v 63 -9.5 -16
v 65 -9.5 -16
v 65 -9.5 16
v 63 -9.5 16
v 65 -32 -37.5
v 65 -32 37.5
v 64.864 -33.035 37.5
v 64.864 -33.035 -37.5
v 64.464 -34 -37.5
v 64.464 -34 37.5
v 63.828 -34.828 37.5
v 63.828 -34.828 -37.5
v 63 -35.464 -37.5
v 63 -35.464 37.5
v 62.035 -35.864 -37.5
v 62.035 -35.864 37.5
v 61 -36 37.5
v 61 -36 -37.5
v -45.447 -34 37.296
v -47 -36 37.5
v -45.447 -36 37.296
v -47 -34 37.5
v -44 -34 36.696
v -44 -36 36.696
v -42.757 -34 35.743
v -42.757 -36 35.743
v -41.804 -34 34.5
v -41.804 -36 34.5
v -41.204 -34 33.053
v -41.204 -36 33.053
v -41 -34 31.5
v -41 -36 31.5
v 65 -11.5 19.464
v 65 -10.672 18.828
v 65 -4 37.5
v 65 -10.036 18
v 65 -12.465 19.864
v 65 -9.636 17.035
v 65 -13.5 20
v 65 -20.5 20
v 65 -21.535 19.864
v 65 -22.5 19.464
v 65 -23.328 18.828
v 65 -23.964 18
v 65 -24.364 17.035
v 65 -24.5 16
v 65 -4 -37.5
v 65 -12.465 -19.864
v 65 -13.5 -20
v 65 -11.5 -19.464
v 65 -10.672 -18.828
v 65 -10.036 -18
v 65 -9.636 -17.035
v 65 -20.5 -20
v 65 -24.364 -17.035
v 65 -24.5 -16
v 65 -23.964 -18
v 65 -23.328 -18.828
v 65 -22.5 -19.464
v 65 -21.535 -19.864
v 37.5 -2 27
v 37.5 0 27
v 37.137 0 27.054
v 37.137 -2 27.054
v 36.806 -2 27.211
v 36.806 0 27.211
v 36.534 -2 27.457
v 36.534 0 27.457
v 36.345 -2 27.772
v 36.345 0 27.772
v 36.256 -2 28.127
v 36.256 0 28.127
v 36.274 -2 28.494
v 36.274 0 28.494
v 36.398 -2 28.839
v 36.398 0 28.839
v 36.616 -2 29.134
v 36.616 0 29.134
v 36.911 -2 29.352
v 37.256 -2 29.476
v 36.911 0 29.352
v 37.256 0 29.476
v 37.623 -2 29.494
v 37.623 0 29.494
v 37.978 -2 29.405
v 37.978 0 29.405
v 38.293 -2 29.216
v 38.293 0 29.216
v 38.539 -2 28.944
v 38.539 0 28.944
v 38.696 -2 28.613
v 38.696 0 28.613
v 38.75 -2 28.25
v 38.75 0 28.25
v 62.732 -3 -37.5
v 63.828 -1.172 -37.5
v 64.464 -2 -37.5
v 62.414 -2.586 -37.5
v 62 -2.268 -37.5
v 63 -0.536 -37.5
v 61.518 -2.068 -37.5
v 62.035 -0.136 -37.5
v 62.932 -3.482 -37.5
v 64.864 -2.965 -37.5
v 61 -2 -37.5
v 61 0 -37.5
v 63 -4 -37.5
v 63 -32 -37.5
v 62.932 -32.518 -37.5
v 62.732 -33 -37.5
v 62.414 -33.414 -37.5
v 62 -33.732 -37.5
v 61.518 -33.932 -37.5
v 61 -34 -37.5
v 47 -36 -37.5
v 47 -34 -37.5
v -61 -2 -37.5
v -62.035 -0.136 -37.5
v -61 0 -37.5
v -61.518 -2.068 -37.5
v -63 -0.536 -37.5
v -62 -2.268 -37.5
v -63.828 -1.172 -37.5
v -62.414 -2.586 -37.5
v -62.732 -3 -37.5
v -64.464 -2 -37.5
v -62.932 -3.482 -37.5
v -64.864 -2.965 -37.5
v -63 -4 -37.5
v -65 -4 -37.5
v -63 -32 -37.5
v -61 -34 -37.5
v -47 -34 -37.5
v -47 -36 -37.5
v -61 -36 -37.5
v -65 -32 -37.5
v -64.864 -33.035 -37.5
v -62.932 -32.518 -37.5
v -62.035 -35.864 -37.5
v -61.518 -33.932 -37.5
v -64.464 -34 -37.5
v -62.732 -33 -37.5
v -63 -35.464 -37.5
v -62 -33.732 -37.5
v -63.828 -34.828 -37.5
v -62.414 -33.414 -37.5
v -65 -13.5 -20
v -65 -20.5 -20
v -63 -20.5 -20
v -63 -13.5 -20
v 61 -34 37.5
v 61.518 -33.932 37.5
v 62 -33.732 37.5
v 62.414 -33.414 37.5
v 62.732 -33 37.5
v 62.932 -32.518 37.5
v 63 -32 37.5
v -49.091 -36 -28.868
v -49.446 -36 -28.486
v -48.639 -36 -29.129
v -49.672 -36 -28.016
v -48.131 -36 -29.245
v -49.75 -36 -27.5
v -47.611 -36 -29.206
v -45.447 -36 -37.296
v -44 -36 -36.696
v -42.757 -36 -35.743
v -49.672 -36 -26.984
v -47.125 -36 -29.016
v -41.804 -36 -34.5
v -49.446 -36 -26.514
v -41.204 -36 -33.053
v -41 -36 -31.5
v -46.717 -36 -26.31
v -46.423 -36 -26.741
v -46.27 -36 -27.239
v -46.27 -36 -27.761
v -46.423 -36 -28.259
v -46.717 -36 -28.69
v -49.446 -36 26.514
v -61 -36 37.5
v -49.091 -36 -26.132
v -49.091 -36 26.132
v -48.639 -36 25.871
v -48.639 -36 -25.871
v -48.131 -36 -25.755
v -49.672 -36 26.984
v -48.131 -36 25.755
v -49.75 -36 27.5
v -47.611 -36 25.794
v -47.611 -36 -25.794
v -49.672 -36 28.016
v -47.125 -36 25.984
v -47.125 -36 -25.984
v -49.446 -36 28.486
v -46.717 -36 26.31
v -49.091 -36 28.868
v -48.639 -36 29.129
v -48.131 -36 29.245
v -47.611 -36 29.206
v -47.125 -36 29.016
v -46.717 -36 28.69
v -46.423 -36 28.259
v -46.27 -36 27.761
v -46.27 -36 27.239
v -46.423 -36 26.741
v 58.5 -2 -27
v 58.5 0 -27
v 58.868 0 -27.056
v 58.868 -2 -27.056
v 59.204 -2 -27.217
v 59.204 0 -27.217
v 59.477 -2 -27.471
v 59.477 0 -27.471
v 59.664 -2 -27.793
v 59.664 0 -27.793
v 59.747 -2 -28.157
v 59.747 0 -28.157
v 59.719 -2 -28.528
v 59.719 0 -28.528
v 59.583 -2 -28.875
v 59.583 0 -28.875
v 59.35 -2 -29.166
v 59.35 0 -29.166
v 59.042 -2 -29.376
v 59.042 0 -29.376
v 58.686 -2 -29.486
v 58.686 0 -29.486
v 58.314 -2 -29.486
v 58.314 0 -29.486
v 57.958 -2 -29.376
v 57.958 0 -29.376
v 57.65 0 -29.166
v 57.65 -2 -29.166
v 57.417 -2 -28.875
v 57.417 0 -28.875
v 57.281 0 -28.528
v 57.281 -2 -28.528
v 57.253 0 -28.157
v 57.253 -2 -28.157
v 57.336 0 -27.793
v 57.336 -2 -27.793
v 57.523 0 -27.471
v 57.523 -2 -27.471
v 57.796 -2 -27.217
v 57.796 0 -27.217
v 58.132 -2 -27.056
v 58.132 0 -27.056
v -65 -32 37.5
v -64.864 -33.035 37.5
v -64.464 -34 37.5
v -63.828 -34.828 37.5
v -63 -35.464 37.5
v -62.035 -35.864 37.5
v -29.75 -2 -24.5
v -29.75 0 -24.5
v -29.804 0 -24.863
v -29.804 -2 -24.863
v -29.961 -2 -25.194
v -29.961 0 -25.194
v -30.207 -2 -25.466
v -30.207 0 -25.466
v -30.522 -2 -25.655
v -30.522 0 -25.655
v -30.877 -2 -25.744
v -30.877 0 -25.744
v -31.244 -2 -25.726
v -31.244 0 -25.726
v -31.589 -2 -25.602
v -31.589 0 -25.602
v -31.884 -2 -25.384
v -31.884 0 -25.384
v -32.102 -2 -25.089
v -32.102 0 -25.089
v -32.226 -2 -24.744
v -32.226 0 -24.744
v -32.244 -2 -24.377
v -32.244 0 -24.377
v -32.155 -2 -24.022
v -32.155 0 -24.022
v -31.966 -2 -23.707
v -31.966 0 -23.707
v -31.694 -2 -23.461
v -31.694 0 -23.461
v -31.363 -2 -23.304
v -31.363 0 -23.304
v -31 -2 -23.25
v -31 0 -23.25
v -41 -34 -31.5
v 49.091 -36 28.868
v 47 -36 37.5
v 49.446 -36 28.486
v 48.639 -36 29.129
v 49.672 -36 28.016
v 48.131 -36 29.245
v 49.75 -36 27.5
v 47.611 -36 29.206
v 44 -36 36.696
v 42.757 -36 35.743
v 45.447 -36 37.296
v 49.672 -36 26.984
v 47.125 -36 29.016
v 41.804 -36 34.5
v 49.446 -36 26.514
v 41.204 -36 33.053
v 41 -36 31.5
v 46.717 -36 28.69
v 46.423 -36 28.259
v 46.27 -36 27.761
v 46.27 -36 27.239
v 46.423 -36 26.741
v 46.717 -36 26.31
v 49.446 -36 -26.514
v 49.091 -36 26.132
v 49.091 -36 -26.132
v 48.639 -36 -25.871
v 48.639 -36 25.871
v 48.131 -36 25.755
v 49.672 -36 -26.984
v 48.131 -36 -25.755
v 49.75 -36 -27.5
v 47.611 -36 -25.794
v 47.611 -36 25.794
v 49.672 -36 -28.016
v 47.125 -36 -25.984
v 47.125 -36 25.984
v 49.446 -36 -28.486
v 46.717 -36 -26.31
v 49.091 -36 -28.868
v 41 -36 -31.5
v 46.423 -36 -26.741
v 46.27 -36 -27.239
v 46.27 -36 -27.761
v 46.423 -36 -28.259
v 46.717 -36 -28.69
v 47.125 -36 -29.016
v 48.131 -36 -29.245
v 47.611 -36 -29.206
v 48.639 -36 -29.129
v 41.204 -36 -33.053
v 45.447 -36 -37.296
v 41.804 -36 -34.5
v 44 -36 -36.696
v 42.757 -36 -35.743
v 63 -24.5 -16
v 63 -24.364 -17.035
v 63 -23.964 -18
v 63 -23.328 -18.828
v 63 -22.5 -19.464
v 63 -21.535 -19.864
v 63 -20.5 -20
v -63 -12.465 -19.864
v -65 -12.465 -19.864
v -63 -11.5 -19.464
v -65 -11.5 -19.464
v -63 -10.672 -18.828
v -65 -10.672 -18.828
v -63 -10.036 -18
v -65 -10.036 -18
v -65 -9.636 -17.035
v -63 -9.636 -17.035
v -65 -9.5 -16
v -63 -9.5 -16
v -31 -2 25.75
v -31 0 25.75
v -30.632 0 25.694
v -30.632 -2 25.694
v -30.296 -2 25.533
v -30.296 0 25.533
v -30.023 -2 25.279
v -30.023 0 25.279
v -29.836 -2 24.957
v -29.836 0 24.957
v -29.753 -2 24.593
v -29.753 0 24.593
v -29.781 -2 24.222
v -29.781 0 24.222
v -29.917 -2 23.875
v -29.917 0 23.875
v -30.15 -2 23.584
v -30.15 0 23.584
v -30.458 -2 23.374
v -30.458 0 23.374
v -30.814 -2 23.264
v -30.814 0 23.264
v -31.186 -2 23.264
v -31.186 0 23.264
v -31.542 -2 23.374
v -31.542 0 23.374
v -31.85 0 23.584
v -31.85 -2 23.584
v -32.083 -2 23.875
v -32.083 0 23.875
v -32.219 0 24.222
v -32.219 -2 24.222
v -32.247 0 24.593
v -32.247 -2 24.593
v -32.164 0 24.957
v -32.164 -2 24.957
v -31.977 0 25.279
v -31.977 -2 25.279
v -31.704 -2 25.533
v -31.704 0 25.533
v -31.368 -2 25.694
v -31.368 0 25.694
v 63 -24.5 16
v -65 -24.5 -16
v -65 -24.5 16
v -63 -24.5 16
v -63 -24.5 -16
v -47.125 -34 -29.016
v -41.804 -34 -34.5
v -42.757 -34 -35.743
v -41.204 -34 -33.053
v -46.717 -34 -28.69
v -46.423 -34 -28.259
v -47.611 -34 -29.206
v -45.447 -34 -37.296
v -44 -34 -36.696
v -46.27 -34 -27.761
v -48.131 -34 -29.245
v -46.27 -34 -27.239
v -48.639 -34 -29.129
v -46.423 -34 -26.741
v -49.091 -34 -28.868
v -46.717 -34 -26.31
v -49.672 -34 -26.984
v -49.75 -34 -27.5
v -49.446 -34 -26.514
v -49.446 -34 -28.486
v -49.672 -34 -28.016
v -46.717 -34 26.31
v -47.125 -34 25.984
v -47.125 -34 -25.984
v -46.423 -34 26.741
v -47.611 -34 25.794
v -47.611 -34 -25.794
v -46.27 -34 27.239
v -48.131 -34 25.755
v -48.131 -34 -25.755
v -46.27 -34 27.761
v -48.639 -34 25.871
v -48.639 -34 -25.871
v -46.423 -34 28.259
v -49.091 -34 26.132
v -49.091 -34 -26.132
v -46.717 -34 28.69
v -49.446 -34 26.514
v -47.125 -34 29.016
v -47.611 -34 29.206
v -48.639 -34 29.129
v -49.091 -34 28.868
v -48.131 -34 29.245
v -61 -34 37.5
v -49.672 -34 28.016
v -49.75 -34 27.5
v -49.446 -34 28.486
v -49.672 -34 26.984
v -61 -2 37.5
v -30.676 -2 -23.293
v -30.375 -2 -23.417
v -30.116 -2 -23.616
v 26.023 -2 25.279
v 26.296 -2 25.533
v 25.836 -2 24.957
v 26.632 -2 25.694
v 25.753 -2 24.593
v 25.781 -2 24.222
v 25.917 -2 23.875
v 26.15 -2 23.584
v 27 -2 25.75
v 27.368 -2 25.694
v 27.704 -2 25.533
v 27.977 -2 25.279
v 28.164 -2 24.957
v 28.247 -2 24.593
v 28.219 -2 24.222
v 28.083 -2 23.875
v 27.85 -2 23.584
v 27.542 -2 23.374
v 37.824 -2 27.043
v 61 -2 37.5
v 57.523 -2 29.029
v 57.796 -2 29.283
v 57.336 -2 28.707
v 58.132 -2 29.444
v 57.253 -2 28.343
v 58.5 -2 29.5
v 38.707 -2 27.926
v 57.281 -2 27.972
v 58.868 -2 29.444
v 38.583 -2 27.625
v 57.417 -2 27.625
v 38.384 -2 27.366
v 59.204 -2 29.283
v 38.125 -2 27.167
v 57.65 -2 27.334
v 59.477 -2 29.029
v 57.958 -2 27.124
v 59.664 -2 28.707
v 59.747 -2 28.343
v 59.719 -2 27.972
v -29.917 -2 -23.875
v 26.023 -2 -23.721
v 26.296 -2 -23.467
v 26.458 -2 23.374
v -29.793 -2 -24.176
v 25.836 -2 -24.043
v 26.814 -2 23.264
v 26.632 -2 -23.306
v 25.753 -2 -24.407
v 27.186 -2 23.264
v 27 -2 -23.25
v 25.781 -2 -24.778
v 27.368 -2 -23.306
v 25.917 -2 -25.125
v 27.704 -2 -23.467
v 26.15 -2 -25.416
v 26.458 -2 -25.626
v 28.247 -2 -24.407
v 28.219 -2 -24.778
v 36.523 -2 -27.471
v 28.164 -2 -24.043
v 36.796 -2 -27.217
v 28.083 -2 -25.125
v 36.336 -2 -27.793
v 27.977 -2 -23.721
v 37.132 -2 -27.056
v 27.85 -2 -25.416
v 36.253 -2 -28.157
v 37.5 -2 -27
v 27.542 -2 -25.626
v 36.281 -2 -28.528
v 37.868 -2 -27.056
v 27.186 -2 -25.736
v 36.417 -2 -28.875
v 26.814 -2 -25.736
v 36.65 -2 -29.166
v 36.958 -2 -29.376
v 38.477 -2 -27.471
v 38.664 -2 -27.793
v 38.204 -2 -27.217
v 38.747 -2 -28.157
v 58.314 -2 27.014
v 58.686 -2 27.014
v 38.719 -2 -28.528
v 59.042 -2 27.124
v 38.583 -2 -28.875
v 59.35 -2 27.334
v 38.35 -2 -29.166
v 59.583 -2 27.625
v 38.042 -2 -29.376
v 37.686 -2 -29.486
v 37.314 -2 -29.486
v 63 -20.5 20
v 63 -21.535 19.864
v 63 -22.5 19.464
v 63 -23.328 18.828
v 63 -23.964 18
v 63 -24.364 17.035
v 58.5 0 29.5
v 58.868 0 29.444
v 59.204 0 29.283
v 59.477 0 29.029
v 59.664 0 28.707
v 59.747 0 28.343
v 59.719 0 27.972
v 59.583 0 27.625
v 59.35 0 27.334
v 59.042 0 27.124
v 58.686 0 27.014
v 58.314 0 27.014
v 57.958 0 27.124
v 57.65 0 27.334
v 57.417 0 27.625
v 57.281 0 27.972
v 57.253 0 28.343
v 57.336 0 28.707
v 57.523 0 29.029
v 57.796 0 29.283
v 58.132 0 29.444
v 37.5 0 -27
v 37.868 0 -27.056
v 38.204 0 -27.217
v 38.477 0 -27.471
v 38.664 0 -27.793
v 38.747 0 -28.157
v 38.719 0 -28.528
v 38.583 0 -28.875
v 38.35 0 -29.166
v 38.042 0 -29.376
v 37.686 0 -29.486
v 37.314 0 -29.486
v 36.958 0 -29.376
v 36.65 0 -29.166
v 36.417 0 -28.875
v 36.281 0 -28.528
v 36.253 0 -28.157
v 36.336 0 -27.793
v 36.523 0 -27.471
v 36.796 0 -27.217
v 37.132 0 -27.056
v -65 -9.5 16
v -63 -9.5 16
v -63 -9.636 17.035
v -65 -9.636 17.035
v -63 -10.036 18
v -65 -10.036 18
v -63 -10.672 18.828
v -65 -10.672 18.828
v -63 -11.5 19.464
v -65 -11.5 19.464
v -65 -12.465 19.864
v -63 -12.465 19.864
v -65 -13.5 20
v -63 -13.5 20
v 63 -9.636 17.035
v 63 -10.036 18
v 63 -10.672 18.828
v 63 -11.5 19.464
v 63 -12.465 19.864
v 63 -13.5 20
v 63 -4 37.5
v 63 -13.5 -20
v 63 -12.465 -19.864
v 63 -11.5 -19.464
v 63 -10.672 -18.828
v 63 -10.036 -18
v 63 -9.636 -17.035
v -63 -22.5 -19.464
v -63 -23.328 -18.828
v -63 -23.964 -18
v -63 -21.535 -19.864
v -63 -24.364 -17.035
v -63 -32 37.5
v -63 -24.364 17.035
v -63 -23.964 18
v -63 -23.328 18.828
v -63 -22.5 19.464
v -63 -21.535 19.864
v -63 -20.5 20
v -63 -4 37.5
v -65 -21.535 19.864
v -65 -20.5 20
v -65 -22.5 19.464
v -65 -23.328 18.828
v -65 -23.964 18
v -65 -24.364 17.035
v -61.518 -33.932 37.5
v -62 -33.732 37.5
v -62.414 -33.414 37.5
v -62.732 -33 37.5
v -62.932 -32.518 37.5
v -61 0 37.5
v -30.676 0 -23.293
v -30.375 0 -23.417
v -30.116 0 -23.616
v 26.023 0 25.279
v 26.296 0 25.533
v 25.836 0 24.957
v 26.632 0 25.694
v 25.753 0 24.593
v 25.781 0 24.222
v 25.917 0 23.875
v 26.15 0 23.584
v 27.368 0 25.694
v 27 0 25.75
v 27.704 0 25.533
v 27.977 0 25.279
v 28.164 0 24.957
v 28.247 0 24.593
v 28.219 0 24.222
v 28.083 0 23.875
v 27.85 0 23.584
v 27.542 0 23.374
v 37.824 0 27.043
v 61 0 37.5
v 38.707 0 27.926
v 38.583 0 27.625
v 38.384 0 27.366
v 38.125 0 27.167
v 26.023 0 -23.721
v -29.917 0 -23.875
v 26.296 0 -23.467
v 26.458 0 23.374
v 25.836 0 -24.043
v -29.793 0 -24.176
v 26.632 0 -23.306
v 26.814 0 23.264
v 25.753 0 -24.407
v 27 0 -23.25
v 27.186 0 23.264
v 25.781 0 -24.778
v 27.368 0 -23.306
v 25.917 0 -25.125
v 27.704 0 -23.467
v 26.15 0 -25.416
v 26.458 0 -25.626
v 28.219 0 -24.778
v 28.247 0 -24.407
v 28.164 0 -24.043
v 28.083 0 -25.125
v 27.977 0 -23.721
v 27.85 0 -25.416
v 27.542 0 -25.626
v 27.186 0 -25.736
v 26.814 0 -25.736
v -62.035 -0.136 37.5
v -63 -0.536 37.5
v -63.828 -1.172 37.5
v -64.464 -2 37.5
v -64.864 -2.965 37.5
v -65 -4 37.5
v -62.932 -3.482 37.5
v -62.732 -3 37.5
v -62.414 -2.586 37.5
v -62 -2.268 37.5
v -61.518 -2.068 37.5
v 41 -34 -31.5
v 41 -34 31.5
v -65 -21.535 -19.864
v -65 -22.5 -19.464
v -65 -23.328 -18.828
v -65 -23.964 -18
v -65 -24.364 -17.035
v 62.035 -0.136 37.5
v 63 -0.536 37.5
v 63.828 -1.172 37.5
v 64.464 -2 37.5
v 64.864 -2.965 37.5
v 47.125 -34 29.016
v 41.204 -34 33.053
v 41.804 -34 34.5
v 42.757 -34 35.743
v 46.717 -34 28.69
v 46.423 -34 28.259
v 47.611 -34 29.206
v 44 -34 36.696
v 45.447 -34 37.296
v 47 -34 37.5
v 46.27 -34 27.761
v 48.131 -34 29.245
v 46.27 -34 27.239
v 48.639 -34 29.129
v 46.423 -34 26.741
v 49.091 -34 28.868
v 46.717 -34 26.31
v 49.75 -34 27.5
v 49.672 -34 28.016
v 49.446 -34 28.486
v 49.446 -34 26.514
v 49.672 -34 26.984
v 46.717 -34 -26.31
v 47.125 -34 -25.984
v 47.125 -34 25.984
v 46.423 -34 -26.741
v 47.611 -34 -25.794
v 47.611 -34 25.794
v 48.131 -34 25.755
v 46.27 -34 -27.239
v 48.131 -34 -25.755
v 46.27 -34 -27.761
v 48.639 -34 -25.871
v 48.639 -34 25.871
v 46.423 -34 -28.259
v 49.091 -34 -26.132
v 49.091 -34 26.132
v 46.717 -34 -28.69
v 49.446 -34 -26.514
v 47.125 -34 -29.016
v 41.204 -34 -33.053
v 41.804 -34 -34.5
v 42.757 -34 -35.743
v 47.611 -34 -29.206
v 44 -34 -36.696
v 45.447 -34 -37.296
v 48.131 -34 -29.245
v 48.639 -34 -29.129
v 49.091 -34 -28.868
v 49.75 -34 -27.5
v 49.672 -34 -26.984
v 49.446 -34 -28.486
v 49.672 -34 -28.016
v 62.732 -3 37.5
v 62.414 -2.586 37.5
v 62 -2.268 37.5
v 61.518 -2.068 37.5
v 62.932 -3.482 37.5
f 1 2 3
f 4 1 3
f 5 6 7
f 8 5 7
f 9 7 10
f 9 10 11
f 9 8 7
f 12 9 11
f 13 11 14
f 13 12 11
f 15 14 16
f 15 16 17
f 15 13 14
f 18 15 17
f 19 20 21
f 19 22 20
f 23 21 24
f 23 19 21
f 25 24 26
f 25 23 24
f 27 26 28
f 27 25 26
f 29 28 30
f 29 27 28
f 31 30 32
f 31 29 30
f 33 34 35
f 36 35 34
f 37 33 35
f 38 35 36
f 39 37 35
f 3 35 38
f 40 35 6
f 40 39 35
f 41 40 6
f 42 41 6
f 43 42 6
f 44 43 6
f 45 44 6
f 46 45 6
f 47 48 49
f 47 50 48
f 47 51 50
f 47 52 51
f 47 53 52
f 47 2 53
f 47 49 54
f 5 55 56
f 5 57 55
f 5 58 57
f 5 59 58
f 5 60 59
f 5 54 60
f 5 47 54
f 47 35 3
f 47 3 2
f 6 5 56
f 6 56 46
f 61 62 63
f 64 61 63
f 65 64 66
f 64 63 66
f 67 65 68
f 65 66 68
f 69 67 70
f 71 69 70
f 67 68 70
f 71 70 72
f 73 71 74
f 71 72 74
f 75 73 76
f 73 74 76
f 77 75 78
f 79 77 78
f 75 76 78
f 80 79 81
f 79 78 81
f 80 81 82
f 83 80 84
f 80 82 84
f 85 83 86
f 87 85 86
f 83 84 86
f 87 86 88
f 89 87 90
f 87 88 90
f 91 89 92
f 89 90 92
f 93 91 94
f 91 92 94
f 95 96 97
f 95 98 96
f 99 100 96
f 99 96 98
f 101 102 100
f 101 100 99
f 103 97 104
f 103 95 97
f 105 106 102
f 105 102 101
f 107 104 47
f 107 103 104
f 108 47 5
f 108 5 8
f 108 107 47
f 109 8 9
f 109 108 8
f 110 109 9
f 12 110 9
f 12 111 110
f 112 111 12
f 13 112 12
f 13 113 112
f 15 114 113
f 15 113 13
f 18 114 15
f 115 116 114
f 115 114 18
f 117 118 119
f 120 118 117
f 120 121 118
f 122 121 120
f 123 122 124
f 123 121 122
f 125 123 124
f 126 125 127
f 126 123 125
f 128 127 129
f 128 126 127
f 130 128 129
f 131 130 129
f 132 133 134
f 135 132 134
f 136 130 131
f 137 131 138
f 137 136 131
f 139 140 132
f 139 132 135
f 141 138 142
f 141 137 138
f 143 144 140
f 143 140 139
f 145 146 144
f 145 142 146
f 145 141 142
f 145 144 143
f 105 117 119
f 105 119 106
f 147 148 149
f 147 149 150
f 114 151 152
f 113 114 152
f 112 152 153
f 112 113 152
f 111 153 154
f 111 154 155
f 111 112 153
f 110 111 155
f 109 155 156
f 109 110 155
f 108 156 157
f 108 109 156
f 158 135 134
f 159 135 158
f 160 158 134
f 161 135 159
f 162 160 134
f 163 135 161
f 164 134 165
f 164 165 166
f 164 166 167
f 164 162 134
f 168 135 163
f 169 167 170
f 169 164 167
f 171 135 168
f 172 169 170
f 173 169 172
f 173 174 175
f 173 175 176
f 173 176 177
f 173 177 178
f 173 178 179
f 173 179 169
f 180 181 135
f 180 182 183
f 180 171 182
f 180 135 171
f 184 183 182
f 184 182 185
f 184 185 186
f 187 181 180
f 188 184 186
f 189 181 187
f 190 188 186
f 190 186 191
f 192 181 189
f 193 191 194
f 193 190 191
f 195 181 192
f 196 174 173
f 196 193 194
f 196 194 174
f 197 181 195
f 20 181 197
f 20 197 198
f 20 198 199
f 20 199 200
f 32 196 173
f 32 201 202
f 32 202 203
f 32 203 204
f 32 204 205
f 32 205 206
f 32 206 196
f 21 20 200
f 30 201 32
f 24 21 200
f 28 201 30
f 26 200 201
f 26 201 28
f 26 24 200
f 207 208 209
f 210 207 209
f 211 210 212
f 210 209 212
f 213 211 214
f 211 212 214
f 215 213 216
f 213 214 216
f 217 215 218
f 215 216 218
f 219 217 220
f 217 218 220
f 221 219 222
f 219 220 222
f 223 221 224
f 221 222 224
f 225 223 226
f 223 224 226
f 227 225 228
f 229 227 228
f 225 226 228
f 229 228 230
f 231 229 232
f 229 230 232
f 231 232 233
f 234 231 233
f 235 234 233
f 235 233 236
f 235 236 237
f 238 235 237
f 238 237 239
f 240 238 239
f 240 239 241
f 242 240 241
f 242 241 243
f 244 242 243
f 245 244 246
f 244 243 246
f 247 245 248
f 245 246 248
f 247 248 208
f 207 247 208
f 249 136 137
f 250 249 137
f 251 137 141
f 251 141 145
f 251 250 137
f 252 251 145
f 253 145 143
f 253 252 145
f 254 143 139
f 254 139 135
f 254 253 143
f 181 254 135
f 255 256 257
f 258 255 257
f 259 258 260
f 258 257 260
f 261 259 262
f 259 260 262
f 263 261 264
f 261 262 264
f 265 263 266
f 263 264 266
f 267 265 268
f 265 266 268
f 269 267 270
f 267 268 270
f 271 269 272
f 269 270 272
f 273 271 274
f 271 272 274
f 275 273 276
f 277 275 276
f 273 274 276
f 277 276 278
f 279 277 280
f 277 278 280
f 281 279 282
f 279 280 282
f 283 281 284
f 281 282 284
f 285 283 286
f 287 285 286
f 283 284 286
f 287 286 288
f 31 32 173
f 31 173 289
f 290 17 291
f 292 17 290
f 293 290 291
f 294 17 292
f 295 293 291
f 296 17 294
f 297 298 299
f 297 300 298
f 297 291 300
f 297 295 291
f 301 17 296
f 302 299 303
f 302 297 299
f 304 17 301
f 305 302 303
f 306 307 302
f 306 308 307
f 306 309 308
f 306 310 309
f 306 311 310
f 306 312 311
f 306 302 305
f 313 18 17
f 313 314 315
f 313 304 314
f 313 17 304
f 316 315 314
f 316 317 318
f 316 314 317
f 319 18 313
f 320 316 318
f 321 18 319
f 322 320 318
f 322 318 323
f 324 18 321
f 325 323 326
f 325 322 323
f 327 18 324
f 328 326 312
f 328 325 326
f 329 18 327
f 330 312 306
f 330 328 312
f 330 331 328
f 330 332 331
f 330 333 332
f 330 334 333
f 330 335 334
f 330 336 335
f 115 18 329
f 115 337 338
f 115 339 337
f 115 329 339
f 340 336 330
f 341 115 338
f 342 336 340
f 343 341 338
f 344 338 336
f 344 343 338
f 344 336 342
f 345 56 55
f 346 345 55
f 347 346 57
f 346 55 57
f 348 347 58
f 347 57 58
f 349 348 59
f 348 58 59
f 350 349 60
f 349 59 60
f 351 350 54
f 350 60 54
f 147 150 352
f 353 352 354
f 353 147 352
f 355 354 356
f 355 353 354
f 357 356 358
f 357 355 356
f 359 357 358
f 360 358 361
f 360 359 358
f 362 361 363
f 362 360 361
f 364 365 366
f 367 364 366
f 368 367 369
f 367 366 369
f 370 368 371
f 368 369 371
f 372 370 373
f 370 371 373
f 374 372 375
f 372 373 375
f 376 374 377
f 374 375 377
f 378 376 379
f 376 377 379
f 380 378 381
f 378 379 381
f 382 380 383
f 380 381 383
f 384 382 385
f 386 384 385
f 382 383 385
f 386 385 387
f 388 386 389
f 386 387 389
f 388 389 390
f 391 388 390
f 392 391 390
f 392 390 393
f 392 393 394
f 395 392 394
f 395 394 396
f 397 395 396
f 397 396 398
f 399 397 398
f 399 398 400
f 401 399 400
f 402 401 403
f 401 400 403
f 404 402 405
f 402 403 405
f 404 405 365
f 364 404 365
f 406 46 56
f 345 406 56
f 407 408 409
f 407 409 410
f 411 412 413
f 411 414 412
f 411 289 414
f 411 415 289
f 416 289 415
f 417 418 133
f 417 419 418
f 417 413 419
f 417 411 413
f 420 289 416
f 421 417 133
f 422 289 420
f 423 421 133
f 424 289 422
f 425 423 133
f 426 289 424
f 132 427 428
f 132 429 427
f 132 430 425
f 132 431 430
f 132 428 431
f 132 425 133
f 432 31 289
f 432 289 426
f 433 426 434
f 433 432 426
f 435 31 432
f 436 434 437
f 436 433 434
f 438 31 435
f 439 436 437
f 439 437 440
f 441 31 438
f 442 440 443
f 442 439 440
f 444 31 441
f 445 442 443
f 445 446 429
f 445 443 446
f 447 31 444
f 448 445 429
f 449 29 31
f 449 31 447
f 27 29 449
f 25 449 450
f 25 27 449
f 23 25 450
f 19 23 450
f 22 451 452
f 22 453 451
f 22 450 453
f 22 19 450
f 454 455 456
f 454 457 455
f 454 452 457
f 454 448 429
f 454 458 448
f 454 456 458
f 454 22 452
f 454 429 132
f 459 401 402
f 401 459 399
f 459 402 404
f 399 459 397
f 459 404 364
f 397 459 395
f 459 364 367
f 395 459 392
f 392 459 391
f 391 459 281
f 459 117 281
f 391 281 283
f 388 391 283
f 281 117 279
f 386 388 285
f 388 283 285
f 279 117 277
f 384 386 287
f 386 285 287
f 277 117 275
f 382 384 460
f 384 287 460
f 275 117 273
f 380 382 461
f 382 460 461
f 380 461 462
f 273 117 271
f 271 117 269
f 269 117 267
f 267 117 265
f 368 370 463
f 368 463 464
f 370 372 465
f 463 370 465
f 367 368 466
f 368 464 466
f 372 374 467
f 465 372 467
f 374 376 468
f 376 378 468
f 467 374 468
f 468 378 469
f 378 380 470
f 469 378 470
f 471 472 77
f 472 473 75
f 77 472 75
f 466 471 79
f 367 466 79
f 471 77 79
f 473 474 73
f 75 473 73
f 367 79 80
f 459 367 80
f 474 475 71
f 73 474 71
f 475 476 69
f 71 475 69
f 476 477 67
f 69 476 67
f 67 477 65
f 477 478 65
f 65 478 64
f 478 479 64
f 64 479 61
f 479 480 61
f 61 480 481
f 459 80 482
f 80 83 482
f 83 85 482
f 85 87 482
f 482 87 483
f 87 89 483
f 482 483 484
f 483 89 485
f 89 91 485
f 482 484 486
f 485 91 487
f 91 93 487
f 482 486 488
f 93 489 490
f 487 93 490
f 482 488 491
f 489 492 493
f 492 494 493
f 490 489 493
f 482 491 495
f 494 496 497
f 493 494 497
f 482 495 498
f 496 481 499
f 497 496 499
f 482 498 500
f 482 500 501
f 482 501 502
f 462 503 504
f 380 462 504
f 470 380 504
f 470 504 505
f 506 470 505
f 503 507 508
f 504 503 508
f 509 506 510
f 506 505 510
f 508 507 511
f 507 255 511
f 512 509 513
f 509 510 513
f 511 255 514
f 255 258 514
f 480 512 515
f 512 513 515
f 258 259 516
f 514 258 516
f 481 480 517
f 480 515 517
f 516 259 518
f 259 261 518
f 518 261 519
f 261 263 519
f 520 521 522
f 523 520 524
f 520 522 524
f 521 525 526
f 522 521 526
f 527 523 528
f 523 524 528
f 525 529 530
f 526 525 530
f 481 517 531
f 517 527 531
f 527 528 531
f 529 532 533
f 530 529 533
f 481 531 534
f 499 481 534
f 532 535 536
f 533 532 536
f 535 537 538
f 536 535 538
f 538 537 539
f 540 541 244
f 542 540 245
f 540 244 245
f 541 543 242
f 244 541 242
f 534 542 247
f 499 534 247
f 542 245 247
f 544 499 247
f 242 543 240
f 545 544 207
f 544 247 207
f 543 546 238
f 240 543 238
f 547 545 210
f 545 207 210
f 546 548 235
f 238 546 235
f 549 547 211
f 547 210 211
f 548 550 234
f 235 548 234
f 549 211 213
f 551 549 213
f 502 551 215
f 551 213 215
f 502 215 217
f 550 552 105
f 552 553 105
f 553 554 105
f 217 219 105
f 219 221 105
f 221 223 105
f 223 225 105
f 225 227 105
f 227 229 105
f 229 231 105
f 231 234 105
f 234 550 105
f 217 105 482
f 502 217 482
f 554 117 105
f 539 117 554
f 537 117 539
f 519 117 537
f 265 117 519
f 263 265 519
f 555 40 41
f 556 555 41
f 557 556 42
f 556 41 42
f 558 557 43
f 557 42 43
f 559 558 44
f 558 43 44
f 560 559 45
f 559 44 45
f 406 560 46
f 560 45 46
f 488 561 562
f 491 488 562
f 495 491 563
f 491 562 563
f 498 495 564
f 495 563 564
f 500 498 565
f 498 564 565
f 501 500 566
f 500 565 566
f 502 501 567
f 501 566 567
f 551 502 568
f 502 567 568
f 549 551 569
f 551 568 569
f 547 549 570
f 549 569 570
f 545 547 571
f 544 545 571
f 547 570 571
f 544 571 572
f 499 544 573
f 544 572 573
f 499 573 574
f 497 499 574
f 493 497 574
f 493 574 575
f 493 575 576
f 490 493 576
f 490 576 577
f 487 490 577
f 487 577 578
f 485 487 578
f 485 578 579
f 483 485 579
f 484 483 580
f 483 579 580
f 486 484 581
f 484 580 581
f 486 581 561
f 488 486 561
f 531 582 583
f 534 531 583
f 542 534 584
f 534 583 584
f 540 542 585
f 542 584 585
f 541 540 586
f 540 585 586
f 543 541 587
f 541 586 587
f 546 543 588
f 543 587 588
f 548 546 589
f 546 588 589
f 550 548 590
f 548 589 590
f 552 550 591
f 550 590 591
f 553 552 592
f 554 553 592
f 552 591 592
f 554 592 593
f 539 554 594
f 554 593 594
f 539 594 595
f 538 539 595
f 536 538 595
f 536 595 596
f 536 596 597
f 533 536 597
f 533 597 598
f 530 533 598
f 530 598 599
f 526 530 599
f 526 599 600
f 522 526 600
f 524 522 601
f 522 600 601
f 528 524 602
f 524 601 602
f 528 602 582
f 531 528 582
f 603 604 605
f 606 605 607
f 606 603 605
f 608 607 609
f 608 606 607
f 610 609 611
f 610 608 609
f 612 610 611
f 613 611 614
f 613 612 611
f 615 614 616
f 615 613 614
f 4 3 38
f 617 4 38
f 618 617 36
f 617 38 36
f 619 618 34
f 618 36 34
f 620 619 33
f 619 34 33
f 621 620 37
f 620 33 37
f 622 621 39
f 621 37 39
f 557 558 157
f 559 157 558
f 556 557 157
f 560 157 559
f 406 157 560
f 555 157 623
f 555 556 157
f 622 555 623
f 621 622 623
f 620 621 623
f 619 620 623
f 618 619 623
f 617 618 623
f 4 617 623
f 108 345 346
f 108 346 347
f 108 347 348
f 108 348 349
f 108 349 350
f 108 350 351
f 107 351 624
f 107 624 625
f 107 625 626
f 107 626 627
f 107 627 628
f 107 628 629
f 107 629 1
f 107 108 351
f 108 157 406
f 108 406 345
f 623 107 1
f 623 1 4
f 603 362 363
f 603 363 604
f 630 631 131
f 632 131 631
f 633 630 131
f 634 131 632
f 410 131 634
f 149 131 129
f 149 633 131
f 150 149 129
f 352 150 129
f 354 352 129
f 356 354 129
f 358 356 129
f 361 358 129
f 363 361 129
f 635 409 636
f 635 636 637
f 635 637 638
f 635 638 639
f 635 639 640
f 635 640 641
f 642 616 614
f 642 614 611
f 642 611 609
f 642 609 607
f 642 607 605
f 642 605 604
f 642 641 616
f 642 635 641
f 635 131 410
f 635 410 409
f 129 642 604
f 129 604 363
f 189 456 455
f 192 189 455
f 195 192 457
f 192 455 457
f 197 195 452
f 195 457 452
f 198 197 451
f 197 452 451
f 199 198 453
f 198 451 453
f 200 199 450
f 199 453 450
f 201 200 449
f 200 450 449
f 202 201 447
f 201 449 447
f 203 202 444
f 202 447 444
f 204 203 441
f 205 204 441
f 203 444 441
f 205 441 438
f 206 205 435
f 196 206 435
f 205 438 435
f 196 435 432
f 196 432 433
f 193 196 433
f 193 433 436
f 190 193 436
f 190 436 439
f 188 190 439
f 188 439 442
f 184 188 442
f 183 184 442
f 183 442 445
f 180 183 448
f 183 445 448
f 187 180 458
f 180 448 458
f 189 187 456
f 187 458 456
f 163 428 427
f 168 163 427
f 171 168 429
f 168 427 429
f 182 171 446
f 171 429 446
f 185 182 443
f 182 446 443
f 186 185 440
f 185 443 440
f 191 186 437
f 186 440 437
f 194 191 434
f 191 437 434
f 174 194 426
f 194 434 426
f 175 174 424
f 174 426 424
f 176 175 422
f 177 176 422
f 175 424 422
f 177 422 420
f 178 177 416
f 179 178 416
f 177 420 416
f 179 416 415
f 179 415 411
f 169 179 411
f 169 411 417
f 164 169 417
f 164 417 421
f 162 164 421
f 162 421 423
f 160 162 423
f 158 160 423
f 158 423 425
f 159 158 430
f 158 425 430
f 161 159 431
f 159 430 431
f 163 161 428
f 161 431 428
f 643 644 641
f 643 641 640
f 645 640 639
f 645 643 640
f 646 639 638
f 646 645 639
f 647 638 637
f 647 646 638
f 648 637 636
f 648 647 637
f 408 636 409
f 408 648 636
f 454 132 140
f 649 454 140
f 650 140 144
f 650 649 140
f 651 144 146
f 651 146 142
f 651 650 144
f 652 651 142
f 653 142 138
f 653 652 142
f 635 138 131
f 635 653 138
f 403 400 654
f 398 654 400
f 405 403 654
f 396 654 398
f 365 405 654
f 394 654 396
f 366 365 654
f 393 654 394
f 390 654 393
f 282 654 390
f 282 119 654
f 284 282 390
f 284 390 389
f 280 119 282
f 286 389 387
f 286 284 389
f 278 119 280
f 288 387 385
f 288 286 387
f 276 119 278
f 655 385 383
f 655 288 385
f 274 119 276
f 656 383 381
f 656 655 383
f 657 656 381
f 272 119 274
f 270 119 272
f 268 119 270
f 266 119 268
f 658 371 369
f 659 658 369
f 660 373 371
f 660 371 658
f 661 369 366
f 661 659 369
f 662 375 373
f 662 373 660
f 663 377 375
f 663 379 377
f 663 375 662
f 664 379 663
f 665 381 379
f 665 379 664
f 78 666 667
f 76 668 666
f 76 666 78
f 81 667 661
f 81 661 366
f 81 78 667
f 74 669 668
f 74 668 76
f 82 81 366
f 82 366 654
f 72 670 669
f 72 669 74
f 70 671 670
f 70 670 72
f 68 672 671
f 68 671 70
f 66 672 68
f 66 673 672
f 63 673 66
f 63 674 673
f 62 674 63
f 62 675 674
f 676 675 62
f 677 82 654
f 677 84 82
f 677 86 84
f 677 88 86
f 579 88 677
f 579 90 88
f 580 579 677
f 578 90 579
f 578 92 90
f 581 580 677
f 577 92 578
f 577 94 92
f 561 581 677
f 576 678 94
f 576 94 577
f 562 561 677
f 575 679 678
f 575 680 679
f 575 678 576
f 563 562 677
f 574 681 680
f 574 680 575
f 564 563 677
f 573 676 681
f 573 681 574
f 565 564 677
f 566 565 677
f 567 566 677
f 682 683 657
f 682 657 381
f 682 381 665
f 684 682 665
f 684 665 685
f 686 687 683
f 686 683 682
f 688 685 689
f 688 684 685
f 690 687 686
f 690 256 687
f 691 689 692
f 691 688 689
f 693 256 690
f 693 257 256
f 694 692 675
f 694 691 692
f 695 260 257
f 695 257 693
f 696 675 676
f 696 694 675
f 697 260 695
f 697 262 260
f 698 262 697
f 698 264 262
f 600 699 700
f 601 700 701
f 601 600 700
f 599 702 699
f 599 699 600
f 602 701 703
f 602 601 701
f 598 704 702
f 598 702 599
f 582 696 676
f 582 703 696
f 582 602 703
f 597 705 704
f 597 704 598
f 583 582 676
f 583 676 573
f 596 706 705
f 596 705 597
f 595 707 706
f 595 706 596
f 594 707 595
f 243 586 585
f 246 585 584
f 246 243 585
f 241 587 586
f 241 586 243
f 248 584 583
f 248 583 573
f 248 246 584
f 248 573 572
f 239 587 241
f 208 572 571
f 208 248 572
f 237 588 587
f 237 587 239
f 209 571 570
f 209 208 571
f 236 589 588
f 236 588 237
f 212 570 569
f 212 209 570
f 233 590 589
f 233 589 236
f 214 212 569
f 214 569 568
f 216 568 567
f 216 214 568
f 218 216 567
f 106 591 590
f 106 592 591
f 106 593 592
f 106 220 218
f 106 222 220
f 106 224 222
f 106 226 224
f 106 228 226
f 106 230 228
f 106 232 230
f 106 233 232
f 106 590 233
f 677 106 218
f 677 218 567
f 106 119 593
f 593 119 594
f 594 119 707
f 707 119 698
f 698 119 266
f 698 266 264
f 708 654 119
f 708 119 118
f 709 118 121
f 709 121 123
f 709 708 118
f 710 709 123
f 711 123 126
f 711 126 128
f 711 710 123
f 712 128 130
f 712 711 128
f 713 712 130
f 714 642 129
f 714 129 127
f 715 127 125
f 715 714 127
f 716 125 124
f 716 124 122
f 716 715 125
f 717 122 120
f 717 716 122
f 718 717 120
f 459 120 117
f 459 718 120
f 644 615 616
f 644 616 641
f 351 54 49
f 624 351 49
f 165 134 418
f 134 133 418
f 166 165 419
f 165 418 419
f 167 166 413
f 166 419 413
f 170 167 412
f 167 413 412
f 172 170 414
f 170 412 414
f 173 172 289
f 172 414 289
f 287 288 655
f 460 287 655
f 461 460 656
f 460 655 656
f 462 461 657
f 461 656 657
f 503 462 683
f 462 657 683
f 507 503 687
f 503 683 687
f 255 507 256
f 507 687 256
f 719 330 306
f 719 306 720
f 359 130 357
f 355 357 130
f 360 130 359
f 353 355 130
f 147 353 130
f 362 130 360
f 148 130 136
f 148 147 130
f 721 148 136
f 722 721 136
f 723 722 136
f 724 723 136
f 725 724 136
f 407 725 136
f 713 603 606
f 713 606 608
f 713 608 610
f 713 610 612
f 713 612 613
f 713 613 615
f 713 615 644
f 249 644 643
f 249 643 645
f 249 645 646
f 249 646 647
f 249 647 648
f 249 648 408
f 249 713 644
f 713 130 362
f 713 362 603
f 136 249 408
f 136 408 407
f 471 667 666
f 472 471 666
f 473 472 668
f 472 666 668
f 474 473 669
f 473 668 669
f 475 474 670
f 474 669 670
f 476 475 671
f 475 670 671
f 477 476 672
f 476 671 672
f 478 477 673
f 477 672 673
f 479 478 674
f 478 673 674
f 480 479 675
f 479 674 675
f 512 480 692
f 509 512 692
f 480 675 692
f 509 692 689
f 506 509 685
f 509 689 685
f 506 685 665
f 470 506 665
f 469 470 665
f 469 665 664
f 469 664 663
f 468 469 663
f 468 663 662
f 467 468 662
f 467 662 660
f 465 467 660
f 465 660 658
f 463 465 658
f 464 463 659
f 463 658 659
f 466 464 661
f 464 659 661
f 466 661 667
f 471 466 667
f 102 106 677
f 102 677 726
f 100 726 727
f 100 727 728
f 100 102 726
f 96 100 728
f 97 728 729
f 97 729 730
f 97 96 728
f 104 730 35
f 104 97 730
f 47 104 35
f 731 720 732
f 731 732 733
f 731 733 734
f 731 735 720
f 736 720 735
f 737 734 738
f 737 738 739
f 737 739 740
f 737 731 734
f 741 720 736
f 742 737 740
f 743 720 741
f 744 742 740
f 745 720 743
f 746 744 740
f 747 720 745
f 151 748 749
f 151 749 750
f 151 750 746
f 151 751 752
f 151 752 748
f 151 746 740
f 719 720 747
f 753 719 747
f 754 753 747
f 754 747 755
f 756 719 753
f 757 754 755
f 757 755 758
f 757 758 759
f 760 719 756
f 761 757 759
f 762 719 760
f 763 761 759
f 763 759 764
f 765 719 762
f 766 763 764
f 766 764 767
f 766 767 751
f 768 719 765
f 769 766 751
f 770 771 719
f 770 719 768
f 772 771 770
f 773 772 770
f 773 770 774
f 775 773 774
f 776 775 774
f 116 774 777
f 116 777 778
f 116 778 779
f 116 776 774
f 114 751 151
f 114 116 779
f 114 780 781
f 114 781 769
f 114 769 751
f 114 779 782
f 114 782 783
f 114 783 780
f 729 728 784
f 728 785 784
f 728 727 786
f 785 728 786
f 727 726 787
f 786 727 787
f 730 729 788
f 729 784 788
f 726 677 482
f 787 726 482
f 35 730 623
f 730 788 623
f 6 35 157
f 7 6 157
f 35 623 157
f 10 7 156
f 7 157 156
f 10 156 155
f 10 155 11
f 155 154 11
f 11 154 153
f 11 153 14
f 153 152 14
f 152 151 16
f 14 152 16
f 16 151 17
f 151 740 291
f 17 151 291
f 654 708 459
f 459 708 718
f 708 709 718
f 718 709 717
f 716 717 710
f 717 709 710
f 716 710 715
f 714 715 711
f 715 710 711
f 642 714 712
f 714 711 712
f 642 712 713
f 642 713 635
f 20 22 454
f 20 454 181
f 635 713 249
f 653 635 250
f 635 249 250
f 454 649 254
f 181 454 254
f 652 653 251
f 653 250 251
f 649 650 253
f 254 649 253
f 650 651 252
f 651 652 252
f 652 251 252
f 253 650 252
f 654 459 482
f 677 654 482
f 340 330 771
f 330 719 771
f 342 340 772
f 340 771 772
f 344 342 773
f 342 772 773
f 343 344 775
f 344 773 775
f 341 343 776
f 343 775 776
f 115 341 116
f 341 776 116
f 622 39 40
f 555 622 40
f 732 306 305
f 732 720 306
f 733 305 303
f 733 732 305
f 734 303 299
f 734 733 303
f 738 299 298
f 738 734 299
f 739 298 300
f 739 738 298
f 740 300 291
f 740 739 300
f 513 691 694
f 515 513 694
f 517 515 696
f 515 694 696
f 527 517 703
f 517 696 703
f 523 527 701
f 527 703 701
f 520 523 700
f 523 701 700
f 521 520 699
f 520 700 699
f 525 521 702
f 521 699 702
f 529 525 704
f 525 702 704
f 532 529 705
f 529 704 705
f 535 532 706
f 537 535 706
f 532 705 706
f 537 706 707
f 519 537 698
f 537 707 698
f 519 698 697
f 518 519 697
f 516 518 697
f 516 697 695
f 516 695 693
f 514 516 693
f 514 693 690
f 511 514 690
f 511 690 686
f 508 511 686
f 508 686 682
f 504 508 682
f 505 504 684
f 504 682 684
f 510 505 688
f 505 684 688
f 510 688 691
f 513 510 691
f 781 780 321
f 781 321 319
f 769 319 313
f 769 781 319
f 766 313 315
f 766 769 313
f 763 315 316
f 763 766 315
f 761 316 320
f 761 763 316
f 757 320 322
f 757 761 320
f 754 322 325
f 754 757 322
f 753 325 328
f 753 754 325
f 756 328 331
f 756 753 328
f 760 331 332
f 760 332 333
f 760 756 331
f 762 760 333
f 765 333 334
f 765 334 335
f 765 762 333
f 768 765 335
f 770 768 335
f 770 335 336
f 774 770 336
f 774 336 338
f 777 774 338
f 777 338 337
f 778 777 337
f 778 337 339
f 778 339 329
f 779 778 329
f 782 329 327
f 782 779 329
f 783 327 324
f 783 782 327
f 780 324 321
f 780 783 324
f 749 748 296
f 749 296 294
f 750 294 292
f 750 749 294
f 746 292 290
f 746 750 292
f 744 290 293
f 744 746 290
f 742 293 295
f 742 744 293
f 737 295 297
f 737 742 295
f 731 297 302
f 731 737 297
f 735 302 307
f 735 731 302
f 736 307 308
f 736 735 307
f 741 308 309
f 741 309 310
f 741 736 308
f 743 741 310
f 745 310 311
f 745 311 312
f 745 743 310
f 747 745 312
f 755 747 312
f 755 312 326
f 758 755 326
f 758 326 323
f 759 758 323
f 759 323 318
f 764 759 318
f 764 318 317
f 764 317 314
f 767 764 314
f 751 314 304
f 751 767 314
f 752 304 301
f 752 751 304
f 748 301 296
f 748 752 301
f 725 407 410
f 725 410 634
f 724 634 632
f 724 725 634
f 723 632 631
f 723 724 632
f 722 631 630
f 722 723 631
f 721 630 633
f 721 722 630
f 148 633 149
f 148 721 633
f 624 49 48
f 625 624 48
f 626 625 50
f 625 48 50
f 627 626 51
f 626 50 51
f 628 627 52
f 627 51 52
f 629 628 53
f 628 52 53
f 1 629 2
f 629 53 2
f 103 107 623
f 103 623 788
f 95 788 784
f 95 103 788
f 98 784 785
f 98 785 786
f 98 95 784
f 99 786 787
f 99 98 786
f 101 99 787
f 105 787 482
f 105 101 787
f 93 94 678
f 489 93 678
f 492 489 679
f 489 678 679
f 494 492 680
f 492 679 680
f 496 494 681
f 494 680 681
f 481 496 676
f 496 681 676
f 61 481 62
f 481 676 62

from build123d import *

# Parameters (mm, degrees)
SKETCH1_W                    = 130
SKETCH1_H                    = 75
BASE_FLANGE1_DEPTH           = 2
EDGE_FLANGE1_STRIP_W         = 12
EDGE_FLANGE1_STRIP_H         = 2
EDGE_FLANGE1_STRIP_CUT_DEPTH = 75
EDGE_FLANGE1_DEPTH           = 75
EDGE_FLANGE2_STRIP_W         = 12
EDGE_FLANGE2_STRIP_H         = 2
EDGE_FLANGE2_STRIP_CUT_DEPTH = 75
EDGE_FLANGE2_DEPTH           = 75
EDGE_FLANGE3_STRIP_W         = 12
EDGE_FLANGE3_STRIP_H         = 2
EDGE_FLANGE3_STRIP_CUT_DEPTH = 75
EDGE_FLANGE3_DEPTH           = 75
EDGE_FLANGE4_STRIP_W         = 12
EDGE_FLANGE4_STRIP_H         = 2
EDGE_FLANGE4_STRIP_CUT_DEPTH = 75
EDGE_FLANGE4_DEPTH           = 75
SKETCH20_R                   = 1.75
CUT_EXTRUDE1_DEPTH           = 2
CUT_EXTRUDE2_DEPTH           = 128
FILLET1_R                    = 6
SKETCH22_R                   = 1.25
CUT_EXTRUDE3_DEPTH           = 2
SKETCH23_R                   = 1.25
CUT_EXTRUDE4_DEPTH           = 2


# Sheet-metal steps are written as plain solids
with BuildPart() as part:
    # Sketch1 → Base-Flange1 (new body)
    with BuildSketch(Plane(origin=(0, 0, 0), x_dir=(1, 0, 0), z_dir=(0, 1, 0))):
        Rectangle(SKETCH1_W, SKETCH1_H)
    extrude(amount=-BASE_FLANGE1_DEPTH)

    # Edge-Flange1 strip (across the edge) → Edge-Flange1 strip cut (cut)
    with BuildSketch(Plane(origin=(-65, -2, 37.5), x_dir=(1, 0, 0), z_dir=(0, 0, -1))):
        with Locations((-2, -1)):
            Rectangle(EDGE_FLANGE1_STRIP_W, EDGE_FLANGE1_STRIP_H)
    extrude(amount=EDGE_FLANGE1_STRIP_CUT_DEPTH, mode=Mode.SUBTRACT)

    # Edge-Flange1 section (across the edge) → Edge-Flange1 (add)
    with BuildSketch(Plane(origin=(-65, -2, 37.5), x_dir=(1, 0, 0), z_dir=(0, 0, -1))):
        with BuildLine():
            Line((0, 2), (0, 32))
            Line((0, 32), (2, 32))
            Line((2, 32), (2, 2))
            ThreePointArc((2, 2), (2.585786438, 0.585786438), (4, 0))
            Line((4, 0), (4, -2))
            ThreePointArc((4, -2), (1.171572875, -0.828427125), (0, 2))
        make_face()
    extrude(amount=EDGE_FLANGE1_DEPTH)

    # Edge-Flange2 strip (across the edge) → Edge-Flange2 strip cut (cut)
    with BuildSketch(Plane(origin=(-63, -34, 37.5), x_dir=(0, 1, 0), z_dir=(0, 0, -1))):
        with Locations((-4, -1)):
            Rectangle(EDGE_FLANGE2_STRIP_W, EDGE_FLANGE2_STRIP_H)
    extrude(amount=EDGE_FLANGE2_STRIP_CUT_DEPTH, mode=Mode.SUBTRACT)

    # Edge-Flange2 section (across the edge) → Edge-Flange2 (add)
    with BuildSketch(Plane(origin=(-63, -34, 37.5), x_dir=(0, 1, 0), z_dir=(0, 0, -1))):
        with BuildLine():
            Line((-2, 2), (-2, 22))
            Line((-2, 22), (0, 22))
            Line((0, 22), (0, 2))
            ThreePointArc((0, 2), (0.585786438, 0.585786438), (2, 0))
            Line((2, 0), (2, -2))
            ThreePointArc((2, -2), (-0.828427125, -0.828427125), (-2, 2))
        make_face()
    extrude(amount=EDGE_FLANGE2_DEPTH)

    # Edge-Flange3 strip (across the edge) → Edge-Flange3 strip cut (cut)
    with BuildSketch(Plane(origin=(65, -2, -37.5), x_dir=(-1, 0, 0), z_dir=(0, 0, 1))):
        with Locations((-2, -1)):
            Rectangle(EDGE_FLANGE3_STRIP_W, EDGE_FLANGE3_STRIP_H)
    extrude(amount=EDGE_FLANGE3_STRIP_CUT_DEPTH, mode=Mode.SUBTRACT)

    # Edge-Flange3 section (across the edge) → Edge-Flange3 (add)
    with BuildSketch(Plane(origin=(65, -2, -37.5), x_dir=(-1, 0, 0), z_dir=(0, 0, 1))):
        with BuildLine():
            Line((0, 2), (0, 32))
            Line((0, 32), (2, 32))
            Line((2, 32), (2, 2))
            ThreePointArc((2, 2), (2.585786438, 0.585786438), (4, 0))
            Line((4, 0), (4, -2))
            ThreePointArc((4, -2), (1.171572875, -0.828427125), (0, 2))
        make_face()
    extrude(amount=EDGE_FLANGE3_DEPTH)

    # Edge-Flange4 strip (across the edge) → Edge-Flange4 strip cut (cut)
    with BuildSketch(Plane(origin=(63, -34, -37.5), x_dir=(0, 1, 0), z_dir=(0, 0, 1))):
        with Locations((-4, -1)):
            Rectangle(EDGE_FLANGE4_STRIP_W, EDGE_FLANGE4_STRIP_H)
    extrude(amount=EDGE_FLANGE4_STRIP_CUT_DEPTH, mode=Mode.SUBTRACT)

    # Edge-Flange4 section (across the edge) → Edge-Flange4 (add)
    with BuildSketch(Plane(origin=(63, -34, -37.5), x_dir=(0, 1, 0), z_dir=(0, 0, 1))):
        with BuildLine():
            Line((-2, 2), (-2, 22))
            Line((-2, 22), (0, 22))
            Line((0, 22), (0, 2))
            ThreePointArc((0, 2), (0.585786438, 0.585786438), (2, 0))
            Line((2, 0), (2, -2))
            ThreePointArc((2, -2), (-0.828427125, -0.828427125), (-2, 2))
        make_face()
    extrude(amount=EDGE_FLANGE4_DEPTH)

    # Sketch20 → Cut-Extrude1 (cut)
    with BuildSketch(Plane(origin=(0, -34, 0), x_dir=(1, 0, 0), z_dir=(0, 1, 0))):
        with Locations(Location((-48, -27.5, 0), (0, 0, 180))):
            Circle(SKETCH20_R)
        with Locations(Location((-48, 27.5, 0), (0, 0, 180))):
            Circle(SKETCH20_R)
    cut_extrude1 = extrude(amount=-CUT_EXTRUDE1_DEPTH, mode=Mode.SUBTRACT)

    # Sketch21 → Cut-Extrude2 (cut)
    with BuildSketch(Plane.ZY.offset(65)):
        with BuildLine():
            Line((-16, -9.5), (16, -9.5))
            ThreePointArc((16, -9.5), (18.828427125, -10.671572875), (20, -13.5))
            Line((20, -13.5), (20, -20.5))
            ThreePointArc((20, -20.5), (18.828427125, -23.328427125), (16, -24.5))
            Line((16, -24.5), (-16, -24.5))
            ThreePointArc((-16, -24.5), (-18.828427125, -23.328427125), (-20, -20.5))
            Line((-20, -20.5), (-20, -13.5))
            ThreePointArc((-20, -13.5), (-18.828427125, -10.671572875), (-16, -9.5))
        make_face()
    cut_extrude2 = extrude(amount=-CUT_EXTRUDE2_DEPTH, mode=Mode.SUBTRACT)

    # Fillet1
    fillet1_edges = [part.edges().sort_by_distance(p)[0] for p in [
        (41, -35, -37.5),
        (41, -35, 37.5),
        (-41, -35, 37.5),
        (-41, -35, -37.5),
    ]]
    fillet(fillet1_edges, radius=FILLET1_R)

    # Mirror4: Cut-Extrude1, Cut-Extrude2 across plane
    add(cut_extrude1.mirror(Plane(origin=(0, 0, 0), x_dir=(0, 0, 1), z_dir=(1, 0, 0))), mode=Mode.SUBTRACT)
    add(cut_extrude2.mirror(Plane(origin=(0, 0, 0), x_dir=(0, 0, 1), z_dir=(1, 0, 0))), mode=Mode.SUBTRACT)

    # Sketch22 → Cut-Extrude3 (cut)
    with BuildSketch(Plane(origin=(0, 0, 0), x_dir=(1, 0, 0), z_dir=(0, 1, 0))):
        with BuildLine():
            Line((-31, 23.25), (-31, 24.5))
            Line((-31, 24.5), (-29.75, 24.5))
            ThreePointArc((-29.75, 24.5), (-31.883883476, 25.383883476), (-31, 23.25))
        make_face()
        with BuildLine():
            Line((-29.75, 24.5), (-31, 24.5))
            Line((-31, 24.5), (-31, 23.25))
            ThreePointArc((-31, 23.25), (-30.116116524, 23.616116524), (-29.75, 24.5))
        make_face()
        with Locations(Location((27, 24.5, 0), (0, 0, 270))):
            Circle(SKETCH22_R)
        with Locations(Location((27, -24.5, 0), (0, 0, 270))):
            Circle(SKETCH22_R)
        with Locations(Location((-31, -24.5, 0), (0, 0, 270))):
            Circle(SKETCH22_R)
    extrude(amount=-CUT_EXTRUDE3_DEPTH, mode=Mode.SUBTRACT)

    # Sketch23 → Cut-Extrude4 (cut)
    with BuildSketch(Plane(origin=(0, 0, 0), x_dir=(1, 0, 0), z_dir=(0, 1, 0))):
        with BuildLine():
            ThreePointArc((38.75, -28.25), (38.383883476, -27.366116524), (37.5, -27))
            Line((37.5, -27), (37.5, -28.25))
            Line((37.5, -28.25), (38.75, -28.25))
        make_face()
        with BuildLine():
            Line((37.5, -28.25), (37.5, -27))
            ThreePointArc((37.5, -27), (36.616116524, -29.133883476), (38.75, -28.25))
            Line((38.75, -28.25), (37.5, -28.25))
        make_face()
        with Locations(Location((37.5, 28.25, 0), (0, 0, 270))):
            Circle(SKETCH23_R)
        with Locations(Location((58.5, 28.25, 0), (0, 0, 270))):
            Circle(SKETCH23_R)
        with Locations(Location((58.5, -28.25, 0), (0, 0, 270))):
            Circle(SKETCH23_R)
    extrude(amount=-CUT_EXTRUDE4_DEPTH, mode=Mode.SUBTRACT)


solid = part.part
